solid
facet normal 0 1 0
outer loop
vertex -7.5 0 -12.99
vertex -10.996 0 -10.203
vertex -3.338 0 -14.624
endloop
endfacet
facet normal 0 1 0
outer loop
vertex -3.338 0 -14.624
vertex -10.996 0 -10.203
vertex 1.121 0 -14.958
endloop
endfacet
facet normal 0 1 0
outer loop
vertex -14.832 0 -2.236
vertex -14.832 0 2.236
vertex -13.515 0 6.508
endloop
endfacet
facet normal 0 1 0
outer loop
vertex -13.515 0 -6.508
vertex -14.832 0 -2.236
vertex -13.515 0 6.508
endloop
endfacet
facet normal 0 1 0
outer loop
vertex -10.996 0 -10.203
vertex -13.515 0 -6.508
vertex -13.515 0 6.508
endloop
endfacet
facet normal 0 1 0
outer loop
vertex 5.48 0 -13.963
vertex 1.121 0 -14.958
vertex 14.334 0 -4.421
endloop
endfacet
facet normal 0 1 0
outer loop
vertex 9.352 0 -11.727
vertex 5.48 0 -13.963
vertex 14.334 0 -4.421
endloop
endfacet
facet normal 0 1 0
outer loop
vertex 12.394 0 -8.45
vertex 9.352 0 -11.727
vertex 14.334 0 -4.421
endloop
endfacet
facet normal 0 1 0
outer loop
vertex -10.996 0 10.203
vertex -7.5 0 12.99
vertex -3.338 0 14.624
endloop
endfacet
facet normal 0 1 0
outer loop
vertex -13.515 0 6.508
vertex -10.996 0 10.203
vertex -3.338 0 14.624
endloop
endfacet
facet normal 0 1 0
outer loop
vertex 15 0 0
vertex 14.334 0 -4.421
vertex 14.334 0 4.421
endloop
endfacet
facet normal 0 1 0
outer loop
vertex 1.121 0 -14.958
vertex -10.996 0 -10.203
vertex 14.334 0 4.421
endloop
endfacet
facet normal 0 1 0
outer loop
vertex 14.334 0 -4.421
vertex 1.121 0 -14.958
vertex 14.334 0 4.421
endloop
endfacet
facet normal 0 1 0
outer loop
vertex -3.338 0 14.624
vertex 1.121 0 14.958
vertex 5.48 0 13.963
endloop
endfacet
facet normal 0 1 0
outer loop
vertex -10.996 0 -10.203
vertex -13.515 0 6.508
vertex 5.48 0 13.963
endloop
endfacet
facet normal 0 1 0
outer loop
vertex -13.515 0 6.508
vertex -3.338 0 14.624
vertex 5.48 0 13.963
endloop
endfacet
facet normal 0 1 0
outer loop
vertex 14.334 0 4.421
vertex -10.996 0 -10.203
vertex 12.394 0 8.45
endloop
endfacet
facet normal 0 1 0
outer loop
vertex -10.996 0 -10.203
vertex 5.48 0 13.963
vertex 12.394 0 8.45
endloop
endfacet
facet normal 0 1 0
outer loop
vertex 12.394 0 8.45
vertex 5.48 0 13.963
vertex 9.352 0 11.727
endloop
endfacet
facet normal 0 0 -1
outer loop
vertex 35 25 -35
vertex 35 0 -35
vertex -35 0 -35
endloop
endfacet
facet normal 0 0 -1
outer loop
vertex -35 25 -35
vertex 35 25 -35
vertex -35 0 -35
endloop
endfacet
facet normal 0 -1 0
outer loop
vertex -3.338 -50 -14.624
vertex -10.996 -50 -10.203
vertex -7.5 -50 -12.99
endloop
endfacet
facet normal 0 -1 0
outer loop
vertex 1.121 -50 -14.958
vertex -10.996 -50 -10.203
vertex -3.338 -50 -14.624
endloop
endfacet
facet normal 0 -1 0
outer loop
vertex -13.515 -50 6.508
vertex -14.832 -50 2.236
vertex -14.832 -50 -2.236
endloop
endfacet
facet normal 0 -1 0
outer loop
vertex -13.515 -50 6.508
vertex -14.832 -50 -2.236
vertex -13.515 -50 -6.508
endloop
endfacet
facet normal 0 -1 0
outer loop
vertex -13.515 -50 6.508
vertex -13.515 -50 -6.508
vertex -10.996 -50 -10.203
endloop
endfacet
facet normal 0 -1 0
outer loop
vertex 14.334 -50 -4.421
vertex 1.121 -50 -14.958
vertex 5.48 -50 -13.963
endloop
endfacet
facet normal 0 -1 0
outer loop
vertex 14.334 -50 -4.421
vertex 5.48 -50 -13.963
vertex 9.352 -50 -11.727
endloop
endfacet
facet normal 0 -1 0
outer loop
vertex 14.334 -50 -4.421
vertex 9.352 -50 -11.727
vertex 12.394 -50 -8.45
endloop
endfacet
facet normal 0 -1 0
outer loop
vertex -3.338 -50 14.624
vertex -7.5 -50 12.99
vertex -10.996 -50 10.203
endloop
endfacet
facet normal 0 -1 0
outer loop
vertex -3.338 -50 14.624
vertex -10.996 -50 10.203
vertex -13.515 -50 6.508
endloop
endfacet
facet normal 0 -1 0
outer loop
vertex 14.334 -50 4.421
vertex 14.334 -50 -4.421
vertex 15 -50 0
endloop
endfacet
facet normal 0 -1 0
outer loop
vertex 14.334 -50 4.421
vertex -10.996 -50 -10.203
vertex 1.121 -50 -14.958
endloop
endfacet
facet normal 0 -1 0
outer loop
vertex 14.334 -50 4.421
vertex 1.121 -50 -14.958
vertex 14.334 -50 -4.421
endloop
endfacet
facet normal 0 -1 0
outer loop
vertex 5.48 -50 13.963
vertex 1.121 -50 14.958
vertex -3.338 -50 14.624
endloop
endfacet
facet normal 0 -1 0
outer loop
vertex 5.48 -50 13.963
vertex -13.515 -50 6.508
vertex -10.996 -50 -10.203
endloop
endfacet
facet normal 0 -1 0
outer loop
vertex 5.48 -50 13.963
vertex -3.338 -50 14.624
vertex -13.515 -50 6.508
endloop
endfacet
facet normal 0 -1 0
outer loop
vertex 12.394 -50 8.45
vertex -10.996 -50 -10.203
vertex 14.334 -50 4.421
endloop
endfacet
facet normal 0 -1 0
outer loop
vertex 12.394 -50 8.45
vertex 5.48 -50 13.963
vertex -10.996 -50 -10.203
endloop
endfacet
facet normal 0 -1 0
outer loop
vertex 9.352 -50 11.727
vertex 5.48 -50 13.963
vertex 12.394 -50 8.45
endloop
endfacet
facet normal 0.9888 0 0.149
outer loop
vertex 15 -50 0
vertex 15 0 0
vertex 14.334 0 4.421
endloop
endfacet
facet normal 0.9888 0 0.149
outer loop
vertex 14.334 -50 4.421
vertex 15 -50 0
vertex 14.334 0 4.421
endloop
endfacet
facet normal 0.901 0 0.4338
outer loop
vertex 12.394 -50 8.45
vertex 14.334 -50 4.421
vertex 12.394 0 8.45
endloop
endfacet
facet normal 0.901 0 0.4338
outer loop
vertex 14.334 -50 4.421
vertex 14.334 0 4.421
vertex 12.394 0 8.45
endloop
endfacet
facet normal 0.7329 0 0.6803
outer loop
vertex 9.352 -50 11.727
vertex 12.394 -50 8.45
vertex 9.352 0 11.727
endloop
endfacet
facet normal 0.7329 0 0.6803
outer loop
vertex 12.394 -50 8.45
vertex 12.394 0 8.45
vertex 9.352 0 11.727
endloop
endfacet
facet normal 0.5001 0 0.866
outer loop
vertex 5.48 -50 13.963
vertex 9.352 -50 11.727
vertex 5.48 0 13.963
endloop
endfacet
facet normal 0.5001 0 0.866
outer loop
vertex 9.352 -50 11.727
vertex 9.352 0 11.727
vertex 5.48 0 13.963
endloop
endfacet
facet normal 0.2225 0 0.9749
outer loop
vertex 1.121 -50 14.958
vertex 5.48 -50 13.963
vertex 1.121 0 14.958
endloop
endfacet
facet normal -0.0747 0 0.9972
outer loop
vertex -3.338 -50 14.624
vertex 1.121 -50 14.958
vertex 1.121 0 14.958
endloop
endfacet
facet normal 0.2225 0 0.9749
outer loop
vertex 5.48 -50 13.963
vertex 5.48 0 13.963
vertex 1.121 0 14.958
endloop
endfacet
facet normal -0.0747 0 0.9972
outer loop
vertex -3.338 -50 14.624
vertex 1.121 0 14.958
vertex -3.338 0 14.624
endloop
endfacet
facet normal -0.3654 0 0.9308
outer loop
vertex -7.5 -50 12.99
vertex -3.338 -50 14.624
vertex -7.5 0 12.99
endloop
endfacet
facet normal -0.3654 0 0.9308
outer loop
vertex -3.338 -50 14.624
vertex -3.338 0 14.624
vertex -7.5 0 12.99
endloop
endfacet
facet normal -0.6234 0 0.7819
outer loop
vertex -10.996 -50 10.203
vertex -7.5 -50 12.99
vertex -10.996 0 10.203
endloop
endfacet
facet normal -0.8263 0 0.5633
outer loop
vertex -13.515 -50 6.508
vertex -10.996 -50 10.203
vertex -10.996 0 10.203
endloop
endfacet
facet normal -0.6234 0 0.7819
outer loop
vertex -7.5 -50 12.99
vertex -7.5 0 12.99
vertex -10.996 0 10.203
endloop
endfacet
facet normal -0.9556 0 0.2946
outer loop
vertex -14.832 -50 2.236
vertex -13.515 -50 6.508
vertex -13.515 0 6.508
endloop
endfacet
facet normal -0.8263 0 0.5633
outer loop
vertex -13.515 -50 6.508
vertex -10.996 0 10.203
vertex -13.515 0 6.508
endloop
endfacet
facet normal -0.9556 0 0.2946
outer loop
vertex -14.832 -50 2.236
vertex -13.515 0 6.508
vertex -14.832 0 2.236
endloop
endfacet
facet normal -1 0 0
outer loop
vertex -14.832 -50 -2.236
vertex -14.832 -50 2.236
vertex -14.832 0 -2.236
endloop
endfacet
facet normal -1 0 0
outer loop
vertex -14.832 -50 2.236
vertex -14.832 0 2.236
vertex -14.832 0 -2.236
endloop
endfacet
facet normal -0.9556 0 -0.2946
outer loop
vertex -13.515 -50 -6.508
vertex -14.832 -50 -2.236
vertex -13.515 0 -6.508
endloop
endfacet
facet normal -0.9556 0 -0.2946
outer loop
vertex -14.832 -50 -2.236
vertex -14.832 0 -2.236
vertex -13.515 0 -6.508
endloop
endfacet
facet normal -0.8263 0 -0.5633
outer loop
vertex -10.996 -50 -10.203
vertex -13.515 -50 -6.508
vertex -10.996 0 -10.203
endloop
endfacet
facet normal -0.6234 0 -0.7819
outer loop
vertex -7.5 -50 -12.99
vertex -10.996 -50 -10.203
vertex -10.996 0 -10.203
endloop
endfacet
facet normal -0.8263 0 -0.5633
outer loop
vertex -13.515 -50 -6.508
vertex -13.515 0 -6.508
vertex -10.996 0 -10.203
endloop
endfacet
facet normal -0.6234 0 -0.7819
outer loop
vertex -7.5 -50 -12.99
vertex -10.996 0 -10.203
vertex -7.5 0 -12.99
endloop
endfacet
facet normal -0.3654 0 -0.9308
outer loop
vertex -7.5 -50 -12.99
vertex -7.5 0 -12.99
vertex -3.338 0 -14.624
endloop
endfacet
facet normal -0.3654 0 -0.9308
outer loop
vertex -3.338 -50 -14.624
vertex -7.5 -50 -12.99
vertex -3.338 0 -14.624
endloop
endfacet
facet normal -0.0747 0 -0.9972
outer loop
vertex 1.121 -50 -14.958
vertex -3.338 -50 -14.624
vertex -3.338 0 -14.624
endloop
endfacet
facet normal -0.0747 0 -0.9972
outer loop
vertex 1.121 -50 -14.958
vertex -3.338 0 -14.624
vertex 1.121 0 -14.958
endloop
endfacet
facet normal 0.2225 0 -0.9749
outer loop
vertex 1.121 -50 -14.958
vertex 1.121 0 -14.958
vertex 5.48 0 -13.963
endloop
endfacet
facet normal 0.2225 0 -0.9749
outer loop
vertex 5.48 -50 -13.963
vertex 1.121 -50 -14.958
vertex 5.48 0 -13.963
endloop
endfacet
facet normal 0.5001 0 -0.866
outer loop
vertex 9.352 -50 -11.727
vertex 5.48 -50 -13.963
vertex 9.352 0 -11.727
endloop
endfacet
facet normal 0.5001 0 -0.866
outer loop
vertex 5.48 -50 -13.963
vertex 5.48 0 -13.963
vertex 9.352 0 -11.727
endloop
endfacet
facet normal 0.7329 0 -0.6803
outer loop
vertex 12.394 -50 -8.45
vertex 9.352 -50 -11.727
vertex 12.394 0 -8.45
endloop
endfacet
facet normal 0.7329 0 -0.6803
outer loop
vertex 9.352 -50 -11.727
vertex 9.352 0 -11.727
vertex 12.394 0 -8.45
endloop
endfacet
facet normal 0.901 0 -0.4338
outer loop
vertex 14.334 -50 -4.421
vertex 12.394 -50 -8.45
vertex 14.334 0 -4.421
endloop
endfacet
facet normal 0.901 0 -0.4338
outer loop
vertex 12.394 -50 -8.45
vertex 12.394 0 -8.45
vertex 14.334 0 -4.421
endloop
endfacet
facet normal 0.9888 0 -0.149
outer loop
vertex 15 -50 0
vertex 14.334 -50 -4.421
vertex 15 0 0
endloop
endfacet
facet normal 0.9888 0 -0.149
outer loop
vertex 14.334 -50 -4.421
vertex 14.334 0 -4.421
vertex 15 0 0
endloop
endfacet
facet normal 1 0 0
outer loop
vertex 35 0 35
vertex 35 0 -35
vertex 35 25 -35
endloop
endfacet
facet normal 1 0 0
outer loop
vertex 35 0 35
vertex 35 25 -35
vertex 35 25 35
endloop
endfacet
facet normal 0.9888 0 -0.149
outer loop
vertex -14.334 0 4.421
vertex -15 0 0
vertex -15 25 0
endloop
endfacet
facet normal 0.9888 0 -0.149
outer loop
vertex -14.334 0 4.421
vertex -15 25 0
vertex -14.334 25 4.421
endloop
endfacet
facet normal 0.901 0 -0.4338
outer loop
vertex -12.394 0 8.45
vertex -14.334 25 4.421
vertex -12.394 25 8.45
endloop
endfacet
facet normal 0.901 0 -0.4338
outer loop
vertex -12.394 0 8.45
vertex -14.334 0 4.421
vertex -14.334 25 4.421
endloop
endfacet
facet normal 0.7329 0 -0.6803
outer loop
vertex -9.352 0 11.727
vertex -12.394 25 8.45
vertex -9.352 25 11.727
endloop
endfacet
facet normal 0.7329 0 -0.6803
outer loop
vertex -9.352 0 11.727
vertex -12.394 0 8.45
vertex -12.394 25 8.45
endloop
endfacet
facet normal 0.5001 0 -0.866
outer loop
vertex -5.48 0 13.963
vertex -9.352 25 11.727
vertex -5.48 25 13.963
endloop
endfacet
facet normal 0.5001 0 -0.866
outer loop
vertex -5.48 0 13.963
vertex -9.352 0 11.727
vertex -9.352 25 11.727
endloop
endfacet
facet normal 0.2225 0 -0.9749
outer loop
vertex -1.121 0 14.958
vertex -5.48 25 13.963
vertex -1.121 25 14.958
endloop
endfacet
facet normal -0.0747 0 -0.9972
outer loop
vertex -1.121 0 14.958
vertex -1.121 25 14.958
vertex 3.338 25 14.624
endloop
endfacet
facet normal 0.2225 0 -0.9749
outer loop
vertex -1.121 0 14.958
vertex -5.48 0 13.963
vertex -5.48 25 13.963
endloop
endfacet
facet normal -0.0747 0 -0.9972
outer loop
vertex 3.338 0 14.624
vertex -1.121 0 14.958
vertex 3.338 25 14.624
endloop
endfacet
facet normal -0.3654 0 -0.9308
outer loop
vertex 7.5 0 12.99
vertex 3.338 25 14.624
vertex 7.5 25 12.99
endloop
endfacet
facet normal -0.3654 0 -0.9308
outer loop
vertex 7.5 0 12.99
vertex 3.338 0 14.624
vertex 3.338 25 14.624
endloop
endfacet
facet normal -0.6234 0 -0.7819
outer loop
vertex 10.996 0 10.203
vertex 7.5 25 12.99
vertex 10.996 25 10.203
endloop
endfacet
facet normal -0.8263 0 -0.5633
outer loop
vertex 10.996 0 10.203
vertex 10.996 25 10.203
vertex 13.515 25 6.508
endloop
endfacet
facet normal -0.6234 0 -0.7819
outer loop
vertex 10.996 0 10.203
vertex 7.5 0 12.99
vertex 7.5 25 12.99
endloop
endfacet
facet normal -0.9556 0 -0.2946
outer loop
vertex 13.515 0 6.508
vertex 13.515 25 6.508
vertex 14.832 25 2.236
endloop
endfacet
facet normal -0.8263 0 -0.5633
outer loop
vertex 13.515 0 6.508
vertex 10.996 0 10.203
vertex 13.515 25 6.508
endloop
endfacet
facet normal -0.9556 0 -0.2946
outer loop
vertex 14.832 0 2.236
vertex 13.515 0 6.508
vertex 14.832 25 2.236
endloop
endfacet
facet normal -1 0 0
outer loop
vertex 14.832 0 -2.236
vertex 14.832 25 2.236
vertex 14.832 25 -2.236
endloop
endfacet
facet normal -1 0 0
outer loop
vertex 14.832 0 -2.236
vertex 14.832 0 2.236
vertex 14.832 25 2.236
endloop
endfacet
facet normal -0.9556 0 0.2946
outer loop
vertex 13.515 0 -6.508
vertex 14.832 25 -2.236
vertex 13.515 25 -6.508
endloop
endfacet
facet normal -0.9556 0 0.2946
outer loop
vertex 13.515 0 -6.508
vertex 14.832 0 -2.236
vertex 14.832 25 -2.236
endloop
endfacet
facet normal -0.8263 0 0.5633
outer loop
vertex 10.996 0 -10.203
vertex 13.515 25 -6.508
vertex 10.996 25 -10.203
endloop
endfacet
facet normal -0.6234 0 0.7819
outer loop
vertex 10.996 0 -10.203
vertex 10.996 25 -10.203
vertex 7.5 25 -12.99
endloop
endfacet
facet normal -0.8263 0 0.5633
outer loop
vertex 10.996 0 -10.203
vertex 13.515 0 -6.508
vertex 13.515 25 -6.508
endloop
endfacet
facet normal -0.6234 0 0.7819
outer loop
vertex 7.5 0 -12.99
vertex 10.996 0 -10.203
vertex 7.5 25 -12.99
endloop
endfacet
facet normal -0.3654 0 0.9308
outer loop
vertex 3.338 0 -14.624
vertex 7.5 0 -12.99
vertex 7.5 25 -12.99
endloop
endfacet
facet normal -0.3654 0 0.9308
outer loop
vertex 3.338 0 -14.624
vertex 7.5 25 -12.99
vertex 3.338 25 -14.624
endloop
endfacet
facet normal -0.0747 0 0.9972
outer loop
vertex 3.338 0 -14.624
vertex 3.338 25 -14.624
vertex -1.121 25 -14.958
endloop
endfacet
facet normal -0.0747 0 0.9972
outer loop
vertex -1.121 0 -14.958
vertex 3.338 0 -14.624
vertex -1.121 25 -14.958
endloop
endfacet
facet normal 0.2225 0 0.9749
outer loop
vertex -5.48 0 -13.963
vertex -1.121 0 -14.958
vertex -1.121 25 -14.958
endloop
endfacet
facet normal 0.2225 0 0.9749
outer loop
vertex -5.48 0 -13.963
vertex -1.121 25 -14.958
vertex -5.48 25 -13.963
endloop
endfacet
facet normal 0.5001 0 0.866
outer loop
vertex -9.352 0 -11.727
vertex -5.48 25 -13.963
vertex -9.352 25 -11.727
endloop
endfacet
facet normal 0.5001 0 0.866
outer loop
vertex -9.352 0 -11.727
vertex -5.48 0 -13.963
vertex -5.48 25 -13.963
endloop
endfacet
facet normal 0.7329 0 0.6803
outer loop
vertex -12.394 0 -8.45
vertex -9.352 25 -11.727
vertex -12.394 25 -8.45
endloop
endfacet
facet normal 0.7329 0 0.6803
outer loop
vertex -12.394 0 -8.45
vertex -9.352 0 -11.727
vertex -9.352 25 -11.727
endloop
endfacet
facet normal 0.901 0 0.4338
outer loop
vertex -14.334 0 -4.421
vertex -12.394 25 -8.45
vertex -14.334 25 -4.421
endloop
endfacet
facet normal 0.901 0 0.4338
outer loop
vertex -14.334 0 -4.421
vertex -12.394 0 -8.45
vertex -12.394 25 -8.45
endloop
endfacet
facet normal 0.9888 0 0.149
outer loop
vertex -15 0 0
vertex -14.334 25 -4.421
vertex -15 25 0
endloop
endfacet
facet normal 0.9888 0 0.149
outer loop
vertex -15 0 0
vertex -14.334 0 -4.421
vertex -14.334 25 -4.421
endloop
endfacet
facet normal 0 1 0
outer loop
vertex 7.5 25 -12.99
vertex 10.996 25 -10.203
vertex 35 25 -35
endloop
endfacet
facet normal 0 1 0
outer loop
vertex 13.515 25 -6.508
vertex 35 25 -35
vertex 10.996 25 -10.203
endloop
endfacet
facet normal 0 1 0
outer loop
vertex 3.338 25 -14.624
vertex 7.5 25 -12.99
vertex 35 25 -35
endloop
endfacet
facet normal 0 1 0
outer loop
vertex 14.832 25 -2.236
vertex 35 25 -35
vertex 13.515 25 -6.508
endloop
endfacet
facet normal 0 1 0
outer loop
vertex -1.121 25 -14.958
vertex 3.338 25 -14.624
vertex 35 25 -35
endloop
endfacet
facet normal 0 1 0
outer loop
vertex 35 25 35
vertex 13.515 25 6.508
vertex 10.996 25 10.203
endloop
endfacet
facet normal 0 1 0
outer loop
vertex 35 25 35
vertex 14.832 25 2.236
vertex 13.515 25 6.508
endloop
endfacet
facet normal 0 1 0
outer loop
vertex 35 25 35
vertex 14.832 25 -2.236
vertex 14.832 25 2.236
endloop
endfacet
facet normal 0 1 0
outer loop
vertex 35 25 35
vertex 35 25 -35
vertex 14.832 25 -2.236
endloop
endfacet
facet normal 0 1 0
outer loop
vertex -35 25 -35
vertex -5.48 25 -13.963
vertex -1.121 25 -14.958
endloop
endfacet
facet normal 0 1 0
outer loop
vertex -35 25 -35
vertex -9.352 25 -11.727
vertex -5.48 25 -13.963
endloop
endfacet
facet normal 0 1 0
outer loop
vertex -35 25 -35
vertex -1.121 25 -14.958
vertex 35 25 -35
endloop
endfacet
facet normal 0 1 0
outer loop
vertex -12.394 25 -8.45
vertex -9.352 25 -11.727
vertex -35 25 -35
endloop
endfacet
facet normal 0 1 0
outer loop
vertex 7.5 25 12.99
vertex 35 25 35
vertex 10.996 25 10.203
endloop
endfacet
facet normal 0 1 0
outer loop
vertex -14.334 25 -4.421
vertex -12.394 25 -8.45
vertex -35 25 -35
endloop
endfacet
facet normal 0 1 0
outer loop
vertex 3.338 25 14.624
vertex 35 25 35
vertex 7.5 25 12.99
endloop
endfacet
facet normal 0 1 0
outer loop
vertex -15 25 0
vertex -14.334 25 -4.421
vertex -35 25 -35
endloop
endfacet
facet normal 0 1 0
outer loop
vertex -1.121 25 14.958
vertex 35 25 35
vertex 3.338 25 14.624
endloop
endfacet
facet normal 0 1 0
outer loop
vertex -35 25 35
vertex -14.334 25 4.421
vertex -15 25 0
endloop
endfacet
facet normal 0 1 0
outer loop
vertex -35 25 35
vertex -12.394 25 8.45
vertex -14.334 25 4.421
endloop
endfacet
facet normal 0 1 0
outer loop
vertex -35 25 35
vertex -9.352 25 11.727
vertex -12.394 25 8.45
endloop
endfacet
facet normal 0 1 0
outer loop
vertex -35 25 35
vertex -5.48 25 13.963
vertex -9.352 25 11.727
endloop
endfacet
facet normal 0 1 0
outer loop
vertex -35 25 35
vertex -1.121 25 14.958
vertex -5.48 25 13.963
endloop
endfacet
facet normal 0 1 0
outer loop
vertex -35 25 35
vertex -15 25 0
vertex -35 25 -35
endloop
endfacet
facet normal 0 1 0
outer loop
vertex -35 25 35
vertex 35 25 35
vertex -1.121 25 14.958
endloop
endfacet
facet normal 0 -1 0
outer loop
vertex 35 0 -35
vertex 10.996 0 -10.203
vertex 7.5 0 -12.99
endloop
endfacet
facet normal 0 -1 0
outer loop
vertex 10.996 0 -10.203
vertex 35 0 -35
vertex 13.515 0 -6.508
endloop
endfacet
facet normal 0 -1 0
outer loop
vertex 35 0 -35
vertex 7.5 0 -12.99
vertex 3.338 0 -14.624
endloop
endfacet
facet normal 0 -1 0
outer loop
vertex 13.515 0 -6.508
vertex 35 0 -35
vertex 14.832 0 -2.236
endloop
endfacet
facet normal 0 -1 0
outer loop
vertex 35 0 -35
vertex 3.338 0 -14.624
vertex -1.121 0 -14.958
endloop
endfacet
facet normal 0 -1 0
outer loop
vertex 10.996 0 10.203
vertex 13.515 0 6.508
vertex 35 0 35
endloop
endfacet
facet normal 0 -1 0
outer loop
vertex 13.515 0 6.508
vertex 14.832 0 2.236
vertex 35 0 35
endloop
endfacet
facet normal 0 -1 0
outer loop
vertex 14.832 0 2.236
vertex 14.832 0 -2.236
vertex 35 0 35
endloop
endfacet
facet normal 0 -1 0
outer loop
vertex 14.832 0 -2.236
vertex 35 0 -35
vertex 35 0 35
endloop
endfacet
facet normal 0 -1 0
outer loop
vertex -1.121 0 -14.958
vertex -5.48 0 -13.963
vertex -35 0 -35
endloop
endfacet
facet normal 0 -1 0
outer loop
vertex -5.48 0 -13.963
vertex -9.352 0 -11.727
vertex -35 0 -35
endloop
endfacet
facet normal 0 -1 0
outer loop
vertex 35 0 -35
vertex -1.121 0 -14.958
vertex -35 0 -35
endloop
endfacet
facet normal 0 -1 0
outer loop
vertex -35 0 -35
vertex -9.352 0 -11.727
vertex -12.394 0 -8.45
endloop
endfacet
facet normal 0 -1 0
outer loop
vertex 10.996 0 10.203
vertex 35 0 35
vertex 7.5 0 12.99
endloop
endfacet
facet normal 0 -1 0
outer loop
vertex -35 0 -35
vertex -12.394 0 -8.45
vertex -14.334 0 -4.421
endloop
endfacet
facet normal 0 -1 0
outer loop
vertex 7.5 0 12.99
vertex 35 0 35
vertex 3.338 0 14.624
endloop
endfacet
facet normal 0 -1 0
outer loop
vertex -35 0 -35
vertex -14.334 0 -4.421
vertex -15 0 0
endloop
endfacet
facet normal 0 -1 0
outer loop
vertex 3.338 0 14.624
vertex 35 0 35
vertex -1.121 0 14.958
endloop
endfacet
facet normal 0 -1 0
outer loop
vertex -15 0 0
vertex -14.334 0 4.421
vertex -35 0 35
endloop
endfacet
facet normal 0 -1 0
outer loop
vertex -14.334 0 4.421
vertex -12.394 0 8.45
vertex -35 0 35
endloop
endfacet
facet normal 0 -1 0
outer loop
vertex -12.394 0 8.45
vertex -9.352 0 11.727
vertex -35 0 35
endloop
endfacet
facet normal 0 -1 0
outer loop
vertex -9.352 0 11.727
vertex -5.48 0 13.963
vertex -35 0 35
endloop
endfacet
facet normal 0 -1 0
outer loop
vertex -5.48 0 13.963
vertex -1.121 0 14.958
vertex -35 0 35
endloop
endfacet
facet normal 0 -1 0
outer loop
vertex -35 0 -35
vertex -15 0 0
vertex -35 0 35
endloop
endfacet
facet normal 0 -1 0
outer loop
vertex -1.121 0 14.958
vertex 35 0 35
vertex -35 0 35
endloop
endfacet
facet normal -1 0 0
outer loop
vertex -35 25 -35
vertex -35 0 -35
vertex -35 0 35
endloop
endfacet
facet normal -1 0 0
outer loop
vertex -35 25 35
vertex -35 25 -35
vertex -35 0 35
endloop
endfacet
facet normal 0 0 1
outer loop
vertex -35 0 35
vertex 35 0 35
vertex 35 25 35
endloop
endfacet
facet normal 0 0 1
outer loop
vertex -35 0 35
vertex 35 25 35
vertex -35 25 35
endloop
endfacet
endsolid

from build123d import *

# Parameters (mm, degrees)
F0_R     = 15
F1_DEPTH = 50
F2_W     = 70
F2_H     = 70
F2_R     = 15
F3_DEPTH = 25


with BuildPart() as f1:
    # F0 (on Front) → F1 (new body)
    with BuildSketch(Plane.XZ):
        Circle(F0_R)
    extrude(amount=F1_DEPTH)


with BuildPart() as f3:
    # F2 (on face) → F3 (new body)
    with BuildSketch(Plane(origin=(0, 0, 0), x_dir=(-1, 0, 0), z_dir=(0, 1, 0))):
        Rectangle(F2_W, F2_H)
        Circle(F2_R, mode=Mode.SUBTRACT)
    extrude(amount=F3_DEPTH)


solid = Compound([f1.part, f3.part])
